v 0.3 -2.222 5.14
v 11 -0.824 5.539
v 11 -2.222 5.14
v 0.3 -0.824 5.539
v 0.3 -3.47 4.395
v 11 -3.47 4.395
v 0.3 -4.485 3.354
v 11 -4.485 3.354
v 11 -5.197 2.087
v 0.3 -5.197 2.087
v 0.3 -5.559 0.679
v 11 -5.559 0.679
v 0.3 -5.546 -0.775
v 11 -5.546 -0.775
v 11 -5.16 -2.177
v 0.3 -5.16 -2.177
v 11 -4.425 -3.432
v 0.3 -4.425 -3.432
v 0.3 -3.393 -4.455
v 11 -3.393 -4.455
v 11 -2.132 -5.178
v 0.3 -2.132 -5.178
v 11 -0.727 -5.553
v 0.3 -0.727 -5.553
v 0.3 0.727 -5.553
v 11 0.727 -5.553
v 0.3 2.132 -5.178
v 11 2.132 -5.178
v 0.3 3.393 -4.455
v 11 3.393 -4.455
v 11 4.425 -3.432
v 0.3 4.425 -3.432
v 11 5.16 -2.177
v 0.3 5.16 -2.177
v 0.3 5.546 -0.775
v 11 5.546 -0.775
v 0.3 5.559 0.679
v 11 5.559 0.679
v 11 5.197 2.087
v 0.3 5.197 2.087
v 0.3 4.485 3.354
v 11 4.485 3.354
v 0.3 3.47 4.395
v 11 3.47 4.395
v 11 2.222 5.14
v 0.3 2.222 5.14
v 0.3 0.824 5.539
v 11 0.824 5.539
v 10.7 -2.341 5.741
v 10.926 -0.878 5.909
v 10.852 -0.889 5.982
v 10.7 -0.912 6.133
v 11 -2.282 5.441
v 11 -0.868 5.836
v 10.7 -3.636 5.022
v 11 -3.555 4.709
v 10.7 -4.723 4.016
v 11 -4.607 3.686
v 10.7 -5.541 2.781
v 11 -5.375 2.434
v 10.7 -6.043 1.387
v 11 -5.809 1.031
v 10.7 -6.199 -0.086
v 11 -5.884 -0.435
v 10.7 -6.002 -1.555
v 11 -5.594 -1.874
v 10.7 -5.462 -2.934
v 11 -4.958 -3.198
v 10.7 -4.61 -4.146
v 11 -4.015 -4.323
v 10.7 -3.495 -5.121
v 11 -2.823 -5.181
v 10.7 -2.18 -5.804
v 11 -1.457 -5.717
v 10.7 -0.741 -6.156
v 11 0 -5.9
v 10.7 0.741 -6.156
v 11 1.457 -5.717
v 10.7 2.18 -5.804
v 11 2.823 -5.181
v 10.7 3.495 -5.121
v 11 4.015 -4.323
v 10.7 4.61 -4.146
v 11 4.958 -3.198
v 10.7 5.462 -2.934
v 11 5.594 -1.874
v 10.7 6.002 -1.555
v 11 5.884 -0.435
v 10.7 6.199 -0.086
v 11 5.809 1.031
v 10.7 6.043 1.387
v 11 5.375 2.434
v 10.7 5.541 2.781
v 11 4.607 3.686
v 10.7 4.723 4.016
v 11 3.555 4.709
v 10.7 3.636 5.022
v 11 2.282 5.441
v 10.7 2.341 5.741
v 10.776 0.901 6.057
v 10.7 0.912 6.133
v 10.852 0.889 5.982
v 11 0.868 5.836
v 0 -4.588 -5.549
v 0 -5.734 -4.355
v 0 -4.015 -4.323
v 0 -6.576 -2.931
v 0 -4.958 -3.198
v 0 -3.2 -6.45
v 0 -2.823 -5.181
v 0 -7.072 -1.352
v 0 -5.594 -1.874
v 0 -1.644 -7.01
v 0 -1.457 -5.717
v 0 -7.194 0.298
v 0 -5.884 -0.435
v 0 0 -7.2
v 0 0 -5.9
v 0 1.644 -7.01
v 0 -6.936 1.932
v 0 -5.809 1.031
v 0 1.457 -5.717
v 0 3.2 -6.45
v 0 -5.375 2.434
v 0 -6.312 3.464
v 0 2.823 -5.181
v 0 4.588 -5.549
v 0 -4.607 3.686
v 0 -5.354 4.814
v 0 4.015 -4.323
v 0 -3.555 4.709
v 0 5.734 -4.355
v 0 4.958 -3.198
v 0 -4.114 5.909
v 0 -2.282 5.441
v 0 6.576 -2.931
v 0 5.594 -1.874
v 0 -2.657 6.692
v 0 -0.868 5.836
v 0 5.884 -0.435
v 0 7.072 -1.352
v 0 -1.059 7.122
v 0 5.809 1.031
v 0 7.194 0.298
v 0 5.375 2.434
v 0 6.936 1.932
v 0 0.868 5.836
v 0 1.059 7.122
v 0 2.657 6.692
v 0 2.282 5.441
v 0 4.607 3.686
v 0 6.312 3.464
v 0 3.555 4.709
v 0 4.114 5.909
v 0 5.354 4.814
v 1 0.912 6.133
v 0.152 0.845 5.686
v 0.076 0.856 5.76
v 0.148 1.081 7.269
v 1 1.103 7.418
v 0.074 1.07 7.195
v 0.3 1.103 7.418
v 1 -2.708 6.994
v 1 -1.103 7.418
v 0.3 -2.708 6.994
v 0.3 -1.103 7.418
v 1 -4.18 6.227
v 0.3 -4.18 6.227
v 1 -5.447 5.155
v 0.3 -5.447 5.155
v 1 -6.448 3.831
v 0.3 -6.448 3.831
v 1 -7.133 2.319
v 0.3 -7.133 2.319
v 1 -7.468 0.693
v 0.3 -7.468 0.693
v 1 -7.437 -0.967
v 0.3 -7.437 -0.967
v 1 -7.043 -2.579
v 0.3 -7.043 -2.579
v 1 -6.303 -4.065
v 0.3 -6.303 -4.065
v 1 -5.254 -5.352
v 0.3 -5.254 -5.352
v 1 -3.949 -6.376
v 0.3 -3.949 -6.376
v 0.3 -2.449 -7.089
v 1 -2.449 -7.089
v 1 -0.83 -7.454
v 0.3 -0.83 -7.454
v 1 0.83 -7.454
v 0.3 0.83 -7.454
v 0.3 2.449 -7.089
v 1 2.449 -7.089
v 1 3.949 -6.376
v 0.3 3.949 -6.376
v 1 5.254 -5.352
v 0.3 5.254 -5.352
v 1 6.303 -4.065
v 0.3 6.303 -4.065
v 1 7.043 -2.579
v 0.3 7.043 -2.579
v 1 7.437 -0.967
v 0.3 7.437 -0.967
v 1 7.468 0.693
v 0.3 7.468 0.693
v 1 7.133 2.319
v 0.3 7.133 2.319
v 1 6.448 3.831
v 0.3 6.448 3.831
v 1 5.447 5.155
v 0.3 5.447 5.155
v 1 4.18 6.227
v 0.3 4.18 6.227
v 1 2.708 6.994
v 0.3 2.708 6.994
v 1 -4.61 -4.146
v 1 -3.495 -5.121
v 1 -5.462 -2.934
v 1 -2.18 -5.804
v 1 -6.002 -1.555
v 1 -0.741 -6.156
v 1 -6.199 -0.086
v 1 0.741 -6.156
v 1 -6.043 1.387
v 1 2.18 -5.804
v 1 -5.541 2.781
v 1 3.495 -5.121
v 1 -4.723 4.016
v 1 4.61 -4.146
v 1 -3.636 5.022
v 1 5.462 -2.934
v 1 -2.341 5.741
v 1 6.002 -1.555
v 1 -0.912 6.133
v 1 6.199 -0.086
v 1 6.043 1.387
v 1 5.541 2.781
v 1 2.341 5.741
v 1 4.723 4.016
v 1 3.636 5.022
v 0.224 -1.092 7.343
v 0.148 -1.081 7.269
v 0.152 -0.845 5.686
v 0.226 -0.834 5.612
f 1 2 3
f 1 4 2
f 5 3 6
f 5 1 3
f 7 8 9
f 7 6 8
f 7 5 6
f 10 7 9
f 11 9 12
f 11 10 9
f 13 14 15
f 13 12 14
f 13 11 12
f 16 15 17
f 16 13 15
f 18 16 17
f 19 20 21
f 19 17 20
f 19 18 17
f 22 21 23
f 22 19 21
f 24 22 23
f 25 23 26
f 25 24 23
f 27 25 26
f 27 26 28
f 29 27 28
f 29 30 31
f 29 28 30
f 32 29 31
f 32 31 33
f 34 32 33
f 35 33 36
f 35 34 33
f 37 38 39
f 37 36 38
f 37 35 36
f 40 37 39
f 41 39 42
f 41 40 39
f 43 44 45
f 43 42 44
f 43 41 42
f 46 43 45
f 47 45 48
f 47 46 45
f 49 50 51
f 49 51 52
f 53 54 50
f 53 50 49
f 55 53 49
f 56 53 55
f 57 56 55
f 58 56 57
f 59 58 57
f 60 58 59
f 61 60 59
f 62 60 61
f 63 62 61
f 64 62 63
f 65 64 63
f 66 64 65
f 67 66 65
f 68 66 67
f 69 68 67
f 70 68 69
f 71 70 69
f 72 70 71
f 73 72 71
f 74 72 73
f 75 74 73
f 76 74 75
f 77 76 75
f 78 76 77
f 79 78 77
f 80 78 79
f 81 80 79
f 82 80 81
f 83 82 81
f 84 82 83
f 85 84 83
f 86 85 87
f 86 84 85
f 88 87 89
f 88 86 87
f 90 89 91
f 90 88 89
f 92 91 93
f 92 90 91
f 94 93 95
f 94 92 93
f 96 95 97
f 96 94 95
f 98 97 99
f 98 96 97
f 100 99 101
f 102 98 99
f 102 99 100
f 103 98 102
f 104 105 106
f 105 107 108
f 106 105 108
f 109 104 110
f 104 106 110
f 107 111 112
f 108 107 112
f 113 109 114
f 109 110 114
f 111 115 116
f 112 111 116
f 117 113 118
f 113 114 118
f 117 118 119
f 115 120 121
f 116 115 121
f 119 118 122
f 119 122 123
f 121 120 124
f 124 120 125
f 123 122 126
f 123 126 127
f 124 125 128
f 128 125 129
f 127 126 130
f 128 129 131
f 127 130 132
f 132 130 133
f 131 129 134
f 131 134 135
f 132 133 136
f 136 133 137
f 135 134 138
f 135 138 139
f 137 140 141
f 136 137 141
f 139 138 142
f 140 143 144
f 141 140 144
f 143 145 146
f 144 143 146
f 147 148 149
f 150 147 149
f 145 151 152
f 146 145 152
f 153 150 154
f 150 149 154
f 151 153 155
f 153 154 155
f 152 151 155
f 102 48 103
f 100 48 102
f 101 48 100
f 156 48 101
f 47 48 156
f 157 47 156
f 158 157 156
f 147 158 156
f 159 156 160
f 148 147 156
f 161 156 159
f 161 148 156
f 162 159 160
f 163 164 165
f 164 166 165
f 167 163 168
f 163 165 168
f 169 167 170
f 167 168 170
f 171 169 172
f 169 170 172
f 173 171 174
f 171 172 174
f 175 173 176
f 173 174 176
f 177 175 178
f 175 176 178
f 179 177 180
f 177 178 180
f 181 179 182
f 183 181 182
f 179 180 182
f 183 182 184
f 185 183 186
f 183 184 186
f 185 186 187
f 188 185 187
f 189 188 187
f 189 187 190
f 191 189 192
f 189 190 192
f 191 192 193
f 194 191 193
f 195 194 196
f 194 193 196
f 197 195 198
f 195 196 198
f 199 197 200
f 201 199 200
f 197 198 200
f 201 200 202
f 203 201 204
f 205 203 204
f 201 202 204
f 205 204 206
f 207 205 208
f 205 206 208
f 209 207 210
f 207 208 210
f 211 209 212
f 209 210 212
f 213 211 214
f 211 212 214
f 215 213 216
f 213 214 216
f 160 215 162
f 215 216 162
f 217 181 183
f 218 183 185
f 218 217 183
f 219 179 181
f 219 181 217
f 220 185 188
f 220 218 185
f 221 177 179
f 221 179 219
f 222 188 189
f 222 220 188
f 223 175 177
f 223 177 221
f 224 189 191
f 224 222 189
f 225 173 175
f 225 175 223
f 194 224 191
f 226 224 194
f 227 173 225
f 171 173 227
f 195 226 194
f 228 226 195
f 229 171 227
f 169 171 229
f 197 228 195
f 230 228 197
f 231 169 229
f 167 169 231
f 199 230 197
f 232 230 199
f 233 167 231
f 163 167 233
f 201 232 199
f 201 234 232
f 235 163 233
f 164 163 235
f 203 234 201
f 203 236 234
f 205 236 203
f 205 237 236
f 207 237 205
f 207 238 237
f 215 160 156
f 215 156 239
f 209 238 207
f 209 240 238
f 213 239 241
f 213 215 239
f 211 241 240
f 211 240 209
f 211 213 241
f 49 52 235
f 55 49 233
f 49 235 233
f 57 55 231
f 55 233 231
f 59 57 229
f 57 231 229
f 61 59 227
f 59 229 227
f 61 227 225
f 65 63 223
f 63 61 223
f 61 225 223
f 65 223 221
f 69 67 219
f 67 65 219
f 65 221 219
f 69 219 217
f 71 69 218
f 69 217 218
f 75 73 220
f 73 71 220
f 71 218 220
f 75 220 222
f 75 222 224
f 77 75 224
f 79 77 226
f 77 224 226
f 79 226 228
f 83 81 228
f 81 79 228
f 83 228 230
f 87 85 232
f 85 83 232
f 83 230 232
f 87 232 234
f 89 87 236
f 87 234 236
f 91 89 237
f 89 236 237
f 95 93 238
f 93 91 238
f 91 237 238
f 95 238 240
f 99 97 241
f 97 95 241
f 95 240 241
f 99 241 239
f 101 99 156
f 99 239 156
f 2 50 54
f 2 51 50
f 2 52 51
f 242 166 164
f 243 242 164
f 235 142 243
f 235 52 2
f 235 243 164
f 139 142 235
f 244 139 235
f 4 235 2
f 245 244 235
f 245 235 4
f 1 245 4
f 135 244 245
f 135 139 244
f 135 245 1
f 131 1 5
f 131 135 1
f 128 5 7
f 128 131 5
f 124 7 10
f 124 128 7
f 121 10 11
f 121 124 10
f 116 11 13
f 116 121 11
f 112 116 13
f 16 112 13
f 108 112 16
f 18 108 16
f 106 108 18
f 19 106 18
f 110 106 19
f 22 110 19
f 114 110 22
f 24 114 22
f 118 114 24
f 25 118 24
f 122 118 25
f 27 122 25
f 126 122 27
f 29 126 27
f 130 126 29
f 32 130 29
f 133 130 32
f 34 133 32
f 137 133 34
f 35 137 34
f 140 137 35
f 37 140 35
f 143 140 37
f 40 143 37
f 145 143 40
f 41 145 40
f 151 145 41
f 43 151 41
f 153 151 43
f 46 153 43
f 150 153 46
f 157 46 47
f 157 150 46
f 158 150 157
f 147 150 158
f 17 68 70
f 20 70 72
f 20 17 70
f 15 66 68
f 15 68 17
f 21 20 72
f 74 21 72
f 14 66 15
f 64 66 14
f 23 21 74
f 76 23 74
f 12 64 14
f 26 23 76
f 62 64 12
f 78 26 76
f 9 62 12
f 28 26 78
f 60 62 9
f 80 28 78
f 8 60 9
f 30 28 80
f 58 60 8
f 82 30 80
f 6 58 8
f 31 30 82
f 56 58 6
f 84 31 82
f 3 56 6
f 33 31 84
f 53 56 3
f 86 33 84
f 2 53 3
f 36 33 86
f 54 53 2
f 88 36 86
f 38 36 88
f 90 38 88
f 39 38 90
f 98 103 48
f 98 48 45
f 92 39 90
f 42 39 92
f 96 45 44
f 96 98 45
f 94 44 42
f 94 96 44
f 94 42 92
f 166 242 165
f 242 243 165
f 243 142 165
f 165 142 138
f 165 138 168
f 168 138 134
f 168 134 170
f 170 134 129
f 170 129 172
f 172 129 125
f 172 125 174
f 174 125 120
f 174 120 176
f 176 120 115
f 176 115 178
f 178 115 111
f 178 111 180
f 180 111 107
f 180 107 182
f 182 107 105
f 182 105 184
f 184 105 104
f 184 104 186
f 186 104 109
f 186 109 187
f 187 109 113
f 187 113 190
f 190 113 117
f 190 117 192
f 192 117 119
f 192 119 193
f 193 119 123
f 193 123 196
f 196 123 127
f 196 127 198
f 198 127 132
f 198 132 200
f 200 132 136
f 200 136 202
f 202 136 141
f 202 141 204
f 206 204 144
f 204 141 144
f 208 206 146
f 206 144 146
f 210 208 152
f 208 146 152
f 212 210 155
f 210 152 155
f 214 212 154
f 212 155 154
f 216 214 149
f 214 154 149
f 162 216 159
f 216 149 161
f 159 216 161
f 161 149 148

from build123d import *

# Parameters (mm, degrees)
F0_R     = 6.2
F0_R_2   = 5.6
F0_R_3   = 7.5
F1_DEPTH = 1
F2_DEPTH = 11
F3_DEPTH = 11.001
F4_SIZE  = 0.3
F6_DEPTH = 11.001


with BuildPart() as f1:
    # F0 (on Right) → F1 (new body)
    with BuildSketch(Plane.YZ):
        Circle(F0_R)
        Circle(F0_R_2, mode=Mode.SUBTRACT)
        Circle(F0_R_2)
        Circle(F0_R_3)
        Circle(F0_R, mode=Mode.SUBTRACT)
    extrude(amount=F1_DEPTH)

    # F0 (on Right) → F2 (join)
    with BuildSketch(Plane.YZ):
        Circle(F0_R)
        Circle(F0_R_2, mode=Mode.SUBTRACT)
    extrude(amount=F2_DEPTH)

    # F0 (on Right) → F3 (cut, through all)
    with BuildSketch(Plane.YZ):
        Circle(F0_R_2)
    extrude(amount=F3_DEPTH, mode=Mode.SUBTRACT)

    # F4
    f4_edges = [f1.edges().sort_by_distance(p)[0] for p in [
        (0, -5.6, 0),
        (11, -6.2, 0),
        (0, -7.5, 0),
    ]]
    chamfer(f4_edges, length=F4_SIZE)

    # F5 (on Right) → F6 (cut, through all)
    with BuildSketch(Plane.YZ):
        with BuildLine():
            Line((0.588235, 3.956511), (1.25, 8.407586))
            ThreePointArc((1.25, 8.407586), (0, 8.5), (-1.25, 8.407586))
            Line((-1.25, 8.407586), (-0.588235, 3.956511))
            ThreePointArc((-0.588235, 3.956511), (0, 4), (0.588235, 3.956511))
        make_face()
    extrude(amount=F6_DEPTH, mode=Mode.SUBTRACT)


solid = f1.part
